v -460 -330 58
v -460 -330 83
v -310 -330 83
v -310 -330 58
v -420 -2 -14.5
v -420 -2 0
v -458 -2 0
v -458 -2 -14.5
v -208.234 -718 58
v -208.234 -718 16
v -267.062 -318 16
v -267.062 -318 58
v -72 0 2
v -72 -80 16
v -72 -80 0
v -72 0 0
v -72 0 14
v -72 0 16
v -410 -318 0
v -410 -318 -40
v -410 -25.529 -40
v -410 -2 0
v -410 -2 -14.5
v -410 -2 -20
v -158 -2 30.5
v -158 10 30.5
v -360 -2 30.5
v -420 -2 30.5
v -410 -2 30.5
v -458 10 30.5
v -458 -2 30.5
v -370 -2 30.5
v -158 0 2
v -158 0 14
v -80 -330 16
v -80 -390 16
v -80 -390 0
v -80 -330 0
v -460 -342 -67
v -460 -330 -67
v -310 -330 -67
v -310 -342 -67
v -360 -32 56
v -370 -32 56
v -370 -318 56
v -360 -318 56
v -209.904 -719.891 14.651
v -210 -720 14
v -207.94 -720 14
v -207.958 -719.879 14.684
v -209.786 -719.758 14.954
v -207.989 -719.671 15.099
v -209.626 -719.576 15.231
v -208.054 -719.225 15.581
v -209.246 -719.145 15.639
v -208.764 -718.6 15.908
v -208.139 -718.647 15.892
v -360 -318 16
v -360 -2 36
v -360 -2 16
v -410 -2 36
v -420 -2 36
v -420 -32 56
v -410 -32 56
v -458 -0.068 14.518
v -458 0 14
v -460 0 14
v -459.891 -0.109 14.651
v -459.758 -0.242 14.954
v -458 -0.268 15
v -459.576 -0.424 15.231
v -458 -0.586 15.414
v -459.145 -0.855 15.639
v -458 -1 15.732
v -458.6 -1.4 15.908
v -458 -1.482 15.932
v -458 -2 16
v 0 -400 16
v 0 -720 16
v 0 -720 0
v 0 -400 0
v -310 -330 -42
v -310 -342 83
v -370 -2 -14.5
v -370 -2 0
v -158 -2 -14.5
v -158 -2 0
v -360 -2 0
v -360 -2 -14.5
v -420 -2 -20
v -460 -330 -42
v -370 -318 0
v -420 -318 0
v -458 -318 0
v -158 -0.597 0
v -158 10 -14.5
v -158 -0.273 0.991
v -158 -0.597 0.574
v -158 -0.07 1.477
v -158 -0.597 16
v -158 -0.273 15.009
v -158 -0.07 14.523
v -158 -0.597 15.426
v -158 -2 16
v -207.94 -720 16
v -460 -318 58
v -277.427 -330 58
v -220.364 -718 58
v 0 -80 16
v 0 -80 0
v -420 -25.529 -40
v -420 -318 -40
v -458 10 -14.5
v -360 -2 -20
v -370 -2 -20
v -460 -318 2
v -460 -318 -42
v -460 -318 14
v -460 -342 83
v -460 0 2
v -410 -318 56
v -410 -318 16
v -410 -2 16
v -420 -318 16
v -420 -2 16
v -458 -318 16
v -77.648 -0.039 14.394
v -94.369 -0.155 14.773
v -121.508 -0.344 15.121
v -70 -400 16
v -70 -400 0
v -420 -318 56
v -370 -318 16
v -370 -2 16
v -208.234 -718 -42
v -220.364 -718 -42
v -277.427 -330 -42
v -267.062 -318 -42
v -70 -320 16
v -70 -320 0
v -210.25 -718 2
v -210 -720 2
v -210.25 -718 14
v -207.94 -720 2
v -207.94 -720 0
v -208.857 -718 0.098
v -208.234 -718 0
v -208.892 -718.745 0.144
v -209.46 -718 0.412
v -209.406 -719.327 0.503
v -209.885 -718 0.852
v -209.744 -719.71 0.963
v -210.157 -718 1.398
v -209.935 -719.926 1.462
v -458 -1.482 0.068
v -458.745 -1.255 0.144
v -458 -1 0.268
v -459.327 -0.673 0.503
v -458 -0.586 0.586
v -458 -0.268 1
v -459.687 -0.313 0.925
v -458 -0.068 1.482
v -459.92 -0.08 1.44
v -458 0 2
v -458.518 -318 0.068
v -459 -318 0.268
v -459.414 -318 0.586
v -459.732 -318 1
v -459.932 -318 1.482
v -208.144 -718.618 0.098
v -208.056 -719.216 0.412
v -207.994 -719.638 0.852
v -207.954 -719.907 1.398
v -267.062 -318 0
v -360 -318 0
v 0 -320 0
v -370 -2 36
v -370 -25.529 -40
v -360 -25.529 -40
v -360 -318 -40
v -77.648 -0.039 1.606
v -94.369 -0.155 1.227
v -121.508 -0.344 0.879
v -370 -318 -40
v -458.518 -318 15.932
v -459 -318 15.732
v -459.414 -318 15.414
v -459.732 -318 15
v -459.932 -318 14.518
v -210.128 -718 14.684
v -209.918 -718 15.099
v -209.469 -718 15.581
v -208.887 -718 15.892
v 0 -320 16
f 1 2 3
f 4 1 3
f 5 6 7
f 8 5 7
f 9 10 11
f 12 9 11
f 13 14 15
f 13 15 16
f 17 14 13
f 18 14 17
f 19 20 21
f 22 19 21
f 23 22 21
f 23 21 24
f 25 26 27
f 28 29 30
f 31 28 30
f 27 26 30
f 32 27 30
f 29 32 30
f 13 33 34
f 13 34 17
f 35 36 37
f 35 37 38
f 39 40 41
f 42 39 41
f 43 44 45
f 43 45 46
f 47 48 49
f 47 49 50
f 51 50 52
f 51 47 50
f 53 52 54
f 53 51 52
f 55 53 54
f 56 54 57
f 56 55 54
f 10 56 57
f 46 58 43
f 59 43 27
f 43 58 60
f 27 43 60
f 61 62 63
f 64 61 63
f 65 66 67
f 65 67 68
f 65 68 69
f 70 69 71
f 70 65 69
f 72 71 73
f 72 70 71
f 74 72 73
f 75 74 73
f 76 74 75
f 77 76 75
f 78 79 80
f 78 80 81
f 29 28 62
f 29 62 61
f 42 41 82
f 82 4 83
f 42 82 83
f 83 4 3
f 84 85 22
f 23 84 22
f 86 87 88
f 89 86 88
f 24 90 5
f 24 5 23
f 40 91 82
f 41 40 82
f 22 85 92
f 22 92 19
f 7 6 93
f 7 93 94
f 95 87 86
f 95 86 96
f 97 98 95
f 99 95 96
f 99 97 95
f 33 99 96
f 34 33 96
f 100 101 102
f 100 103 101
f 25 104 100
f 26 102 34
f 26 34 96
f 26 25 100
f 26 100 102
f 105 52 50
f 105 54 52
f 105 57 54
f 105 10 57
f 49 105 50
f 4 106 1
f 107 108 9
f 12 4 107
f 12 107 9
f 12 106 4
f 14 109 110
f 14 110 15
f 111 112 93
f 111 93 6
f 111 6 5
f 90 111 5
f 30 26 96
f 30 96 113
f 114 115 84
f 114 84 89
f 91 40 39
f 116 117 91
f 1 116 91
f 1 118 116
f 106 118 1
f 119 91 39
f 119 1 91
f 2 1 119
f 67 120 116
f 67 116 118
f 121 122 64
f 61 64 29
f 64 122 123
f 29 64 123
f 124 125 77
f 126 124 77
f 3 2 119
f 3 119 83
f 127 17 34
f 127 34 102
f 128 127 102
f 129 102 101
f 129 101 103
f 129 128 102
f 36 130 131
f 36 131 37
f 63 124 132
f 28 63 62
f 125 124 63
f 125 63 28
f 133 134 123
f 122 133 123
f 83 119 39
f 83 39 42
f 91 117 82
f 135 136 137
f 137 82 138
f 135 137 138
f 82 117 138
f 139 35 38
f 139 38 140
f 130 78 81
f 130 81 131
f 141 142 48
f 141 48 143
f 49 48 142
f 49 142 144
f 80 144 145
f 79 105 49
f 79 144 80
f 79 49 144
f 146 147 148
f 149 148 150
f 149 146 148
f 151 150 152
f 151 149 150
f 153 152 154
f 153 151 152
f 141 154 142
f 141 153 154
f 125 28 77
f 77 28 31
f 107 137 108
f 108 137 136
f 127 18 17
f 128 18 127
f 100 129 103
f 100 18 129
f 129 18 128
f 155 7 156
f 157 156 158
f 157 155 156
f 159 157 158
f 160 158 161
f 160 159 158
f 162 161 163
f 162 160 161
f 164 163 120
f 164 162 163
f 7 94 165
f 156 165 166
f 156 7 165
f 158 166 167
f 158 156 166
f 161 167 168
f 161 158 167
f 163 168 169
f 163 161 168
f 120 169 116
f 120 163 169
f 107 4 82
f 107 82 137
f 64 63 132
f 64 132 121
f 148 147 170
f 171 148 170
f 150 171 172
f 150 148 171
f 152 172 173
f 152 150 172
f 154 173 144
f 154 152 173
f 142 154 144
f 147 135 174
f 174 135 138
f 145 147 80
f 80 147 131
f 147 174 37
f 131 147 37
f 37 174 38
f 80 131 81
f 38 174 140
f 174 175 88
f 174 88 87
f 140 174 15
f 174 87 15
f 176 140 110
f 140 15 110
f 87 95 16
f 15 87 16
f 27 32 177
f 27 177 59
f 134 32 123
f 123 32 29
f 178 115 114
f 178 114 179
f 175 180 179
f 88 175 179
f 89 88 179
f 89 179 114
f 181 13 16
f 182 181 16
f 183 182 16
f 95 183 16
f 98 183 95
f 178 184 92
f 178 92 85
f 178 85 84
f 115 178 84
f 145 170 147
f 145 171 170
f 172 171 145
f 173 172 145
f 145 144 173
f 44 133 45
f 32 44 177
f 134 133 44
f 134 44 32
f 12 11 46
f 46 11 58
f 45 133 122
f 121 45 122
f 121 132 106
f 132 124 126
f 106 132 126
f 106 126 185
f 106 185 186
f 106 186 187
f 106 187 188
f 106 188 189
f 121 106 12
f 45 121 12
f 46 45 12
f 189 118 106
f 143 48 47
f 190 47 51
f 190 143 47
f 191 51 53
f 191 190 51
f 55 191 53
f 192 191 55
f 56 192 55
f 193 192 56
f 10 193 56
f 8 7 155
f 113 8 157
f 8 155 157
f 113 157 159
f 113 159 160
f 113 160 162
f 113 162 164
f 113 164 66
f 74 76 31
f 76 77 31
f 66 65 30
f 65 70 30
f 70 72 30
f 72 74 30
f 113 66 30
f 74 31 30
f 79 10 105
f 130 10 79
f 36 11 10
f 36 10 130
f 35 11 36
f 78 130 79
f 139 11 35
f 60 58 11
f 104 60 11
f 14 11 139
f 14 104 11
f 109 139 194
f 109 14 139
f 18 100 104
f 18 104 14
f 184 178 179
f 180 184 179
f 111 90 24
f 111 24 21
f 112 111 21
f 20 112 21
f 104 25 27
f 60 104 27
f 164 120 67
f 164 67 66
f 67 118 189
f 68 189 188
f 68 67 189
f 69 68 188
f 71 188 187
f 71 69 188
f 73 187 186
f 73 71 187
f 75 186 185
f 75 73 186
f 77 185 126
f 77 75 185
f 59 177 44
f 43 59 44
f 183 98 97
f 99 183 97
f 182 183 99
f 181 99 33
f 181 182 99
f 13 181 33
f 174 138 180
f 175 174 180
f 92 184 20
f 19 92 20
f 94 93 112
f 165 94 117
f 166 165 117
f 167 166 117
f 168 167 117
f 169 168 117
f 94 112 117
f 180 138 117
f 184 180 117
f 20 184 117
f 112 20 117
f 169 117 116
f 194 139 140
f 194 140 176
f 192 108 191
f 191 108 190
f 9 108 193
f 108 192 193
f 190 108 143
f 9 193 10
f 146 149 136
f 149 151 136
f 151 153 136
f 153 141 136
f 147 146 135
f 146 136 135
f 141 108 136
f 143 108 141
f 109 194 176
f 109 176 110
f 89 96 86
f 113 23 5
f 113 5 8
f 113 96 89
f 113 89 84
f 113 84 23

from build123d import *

# Parameters (mm, degrees)
SKETCH_1_R           = 13
SKETCH_1_R_2         = 37.5
EXTRUDE_1417_DEPTH   = 16
FILLET_1_R           = 2
FILLET_2_R           = 2
EXTRUDE_2_DEPTH      = 40
EXTRUDE_2_DEPTH_BACK = 56
SKETCH_3_W           = 10
SKETCH_3_H           = 316
CUT_EXTRUDE_1_DEPTH  = 836.425640018
CUT_EXTRUDE_2_DEPTH  = 836.425640018
EXTRUDE_5_DEPTH      = 42
EXTRUDE_5_DEPTH_BACK = 58
EXTRUDE_6_DEPTH      = 14.5
EXTRUDE_6_DEPTH_BACK = 30.5
SKETCH_7_W           = 300
SKETCH_7_H           = 12
SKETCH_8_W           = 150
SKETCH_8_H           = 150
EXTRUDE_7_DEPTH      = 12
EXTRUDE_8_DEPTH      = 16


with BuildPart() as part:
    # 草图1 → Extrude 1417 (new body)
    with BuildSketch(Plane.XY):
        with BuildLine():
            Line((0, -320), (-70, -320))
            ThreePointArc((-70, -320), (-77.071067812, -322.928932188), (-80, -330))
            Line((-80, -330), (-80, -390))
            ThreePointArc((-80, -390), (-77.071067812, -397.071067812), (-70, -400))
            Line((-70, -400), (0, -400))
            Line((0, -400), (0, -720))
            Line((0, -720), (-210, -720))
            Line((-210, -720), (-259.124034735, -327.007722123))
            ThreePointArc((-259.124034735, -327.007722123), (-261.767837242, -322.002574593), (-267.062257748, -320))
            Line((-267.062257748, -320), (-460, -320))
            Line((-460, -320), (-460, 0))
            Line((-460, 0), (-72, 0))
            Line((-72, 0), (-72, -80))
            Line((-72, -80), (0, -80))
            Line((0, -80), (0, -320))
        make_face()
        with Locations((-112, -40)):
            Circle(SKETCH_1_R, mode=Mode.SUBTRACT)
        with Locations((-112, -120)):
            Circle(SKETCH_1_R, mode=Mode.SUBTRACT)
        with Locations((-112, -200)):
            Circle(SKETCH_1_R, mode=Mode.SUBTRACT)
        with Locations((-112, -280)):
            Circle(SKETCH_1_R, mode=Mode.SUBTRACT)
        with Locations((-40, -160)):
            Circle(SKETCH_1_R, mode=Mode.SUBTRACT)
        with Locations((-40, -240)):
            Circle(SKETCH_1_R, mode=Mode.SUBTRACT)
        with Locations((-40, -680)):
            Circle(SKETCH_1_R, mode=Mode.SUBTRACT)
        with Locations((-40, -600)):
            Circle(SKETCH_1_R, mode=Mode.SUBTRACT)
        with Locations((-40, -520)):
            Circle(SKETCH_1_R, mode=Mode.SUBTRACT)
        with Locations((-112, -640)):
            Circle(SKETCH_1_R, mode=Mode.SUBTRACT)
        with Locations((-112, -560)):
            Circle(SKETCH_1_R, mode=Mode.SUBTRACT)
        with Locations((-112, -480)):
            Circle(SKETCH_1_R, mode=Mode.SUBTRACT)
        with Locations((-260, -110)):
            Circle(SKETCH_1_R_2, mode=Mode.SUBTRACT)
    extrude(amount=EXTRUDE_1417_DEPTH)

    # 圆角1
    fillet_1_edges = [part.edges().sort_by_distance(p)[0] for p in [
        (-105, -720, 16),
        (0, -560, 16),
        (-35, -400, 16),
        (-77.071067812, -397.071067812, 16),
        (-80, -360, 16),
        (-77.071067812, -322.928932188, 16),
        (-35, -320, 16),
        (0, -200, 16),
        (-36, -80, 16),
        (-125, -40, 16),
        (-72, -40, 16),
        (-261.767837242, -322.002574593, 16),
        (-266, 0, 16),
        (-125, -120, 16),
        (-460, -160, 16),
        (-125, -200, 16),
        (-363.531128874, -320, 16),
        (-125, -280, 16),
        (-53, -160, 16),
        (-53, -240, 16),
        (-53, -680, 16),
        (-53, -600, 16),
        (-53, -520, 16),
        (-234.562017367, -523.503861062, 16),
        (-125, -640, 16),
        (-125, -560, 16),
        (-125, -480, 16),
        (-297.5, -110, 16),
    ]]
    fillet(fillet_1_edges, radius=FILLET_1_R)

    # 圆角2
    fillet_2_edges = [part.edges().sort_by_distance(p)[0] for p in [
        (-363.531128874, -320, 0),
        (-460, -160, 0),
        (-266, 0, 0),
        (-72, -40, 0),
        (-36, -80, 0),
        (0, -200, 0),
        (-35, -320, 0),
        (-77.071067812, -322.928932188, 0),
        (-80, -360, 0),
        (-77.071067812, -397.071067812, 0),
        (-35, -400, 0),
        (0, -560, 0),
        (-105, -720, 0),
        (-234.562017367, -523.503861062, 0),
        (-261.767837242, -322.002574593, 0),
        (-125, -40, 0),
        (-125, -120, 0),
        (-125, -200, 0),
        (-125, -280, 0),
        (-53, -160, 0),
        (-53, -240, 0),
        (-53, -680, 0),
        (-53, -600, 0),
        (-53, -520, 0),
        (-125, -640, 0),
        (-125, -560, 0),
        (-125, -480, 0),
        (-297.5, -110, 0),
    ]]
    fillet(fillet_2_edges, radius=FILLET_2_R)

    # 草图3 → 凸台-拉伸2 (add, two sides: drawn at the far end of the back side and taken through both)
    with BuildSketch(Plane.XY.offset(16).offset(-EXTRUDE_2_DEPTH_BACK)):
        with Locations((-415, -160)):
            Rectangle(SKETCH_3_W, SKETCH_3_H)
        with Locations((-365, -160)):
            Rectangle(SKETCH_3_W, SKETCH_3_H)
    extrude(amount=EXTRUDE_2_DEPTH + EXTRUDE_2_DEPTH_BACK)

    # 草图4 → 切除-拉伸1 (cut, through all)
    with BuildSketch(Plane.ZY.offset(420)):
        Polygon((-20, -2), (-45.5, -32), (-45.5, -2), align=None)
    extrude(amount=-CUT_EXTRUDE_1_DEPTH, mode=Mode.SUBTRACT)

    # 草图5 → 切除-拉伸2 (cut, through all)
    with BuildSketch(Plane.ZY.offset(420)):
        Polygon((36, -2), (56, -32), (56, -2), align=None)
    extrude(amount=-CUT_EXTRUDE_2_DEPTH, mode=Mode.SUBTRACT)

    # 草图6 → 凸台-拉伸5 (add, two sides: drawn at the far end of the back side and taken through both)
    with BuildSketch(Plane.XY.offset(16).offset(-EXTRUDE_5_DEPTH_BACK)):
        Polygon((-267.062257748, -318), (-460, -318), (-460, -330), (-277.426505546, -330), (-220.363518026, -718), (-208.234435563, -718), align=None)
    extrude(amount=EXTRUDE_5_DEPTH + EXTRUDE_5_DEPTH_BACK)

    # 草图7 → 凸台-拉伸6 (add, two sides: drawn at the far end of the back side and taken through both)
    with BuildSketch(Plane(origin=(0, 0, 0), x_dir=(-1, 0, 0), z_dir=(0, 0, -1)).offset(-EXTRUDE_6_DEPTH_BACK)):
        with Locations((308, 4)):
            Rectangle(SKETCH_7_W, SKETCH_7_H)
    extrude(amount=EXTRUDE_6_DEPTH + EXTRUDE_6_DEPTH_BACK)

    # 草图8 → 凸台-拉伸7 (add)
    with BuildSketch(Plane.XZ.offset(330)):
        with Locations((-385, 8)):
            Rectangle(SKETCH_8_W, SKETCH_8_H)
    extrude(amount=EXTRUDE_7_DEPTH)

    # 草图9 → 凸台-拉伸8 (add)
    with BuildSketch(Plane.XY.offset(16)):
        Polygon((0, -720), (0, -400), (-70, -400), (-80, -390), (-80, -330), (-70, -320), (0, -320), (0, -80), (-72, -80), (-72, 0), (-360, -2), (-360, -318), (-267.062257748, -318), (-207.940296452, -720), align=None)
    extrude(amount=-EXTRUDE_8_DEPTH)


solid = part.part
